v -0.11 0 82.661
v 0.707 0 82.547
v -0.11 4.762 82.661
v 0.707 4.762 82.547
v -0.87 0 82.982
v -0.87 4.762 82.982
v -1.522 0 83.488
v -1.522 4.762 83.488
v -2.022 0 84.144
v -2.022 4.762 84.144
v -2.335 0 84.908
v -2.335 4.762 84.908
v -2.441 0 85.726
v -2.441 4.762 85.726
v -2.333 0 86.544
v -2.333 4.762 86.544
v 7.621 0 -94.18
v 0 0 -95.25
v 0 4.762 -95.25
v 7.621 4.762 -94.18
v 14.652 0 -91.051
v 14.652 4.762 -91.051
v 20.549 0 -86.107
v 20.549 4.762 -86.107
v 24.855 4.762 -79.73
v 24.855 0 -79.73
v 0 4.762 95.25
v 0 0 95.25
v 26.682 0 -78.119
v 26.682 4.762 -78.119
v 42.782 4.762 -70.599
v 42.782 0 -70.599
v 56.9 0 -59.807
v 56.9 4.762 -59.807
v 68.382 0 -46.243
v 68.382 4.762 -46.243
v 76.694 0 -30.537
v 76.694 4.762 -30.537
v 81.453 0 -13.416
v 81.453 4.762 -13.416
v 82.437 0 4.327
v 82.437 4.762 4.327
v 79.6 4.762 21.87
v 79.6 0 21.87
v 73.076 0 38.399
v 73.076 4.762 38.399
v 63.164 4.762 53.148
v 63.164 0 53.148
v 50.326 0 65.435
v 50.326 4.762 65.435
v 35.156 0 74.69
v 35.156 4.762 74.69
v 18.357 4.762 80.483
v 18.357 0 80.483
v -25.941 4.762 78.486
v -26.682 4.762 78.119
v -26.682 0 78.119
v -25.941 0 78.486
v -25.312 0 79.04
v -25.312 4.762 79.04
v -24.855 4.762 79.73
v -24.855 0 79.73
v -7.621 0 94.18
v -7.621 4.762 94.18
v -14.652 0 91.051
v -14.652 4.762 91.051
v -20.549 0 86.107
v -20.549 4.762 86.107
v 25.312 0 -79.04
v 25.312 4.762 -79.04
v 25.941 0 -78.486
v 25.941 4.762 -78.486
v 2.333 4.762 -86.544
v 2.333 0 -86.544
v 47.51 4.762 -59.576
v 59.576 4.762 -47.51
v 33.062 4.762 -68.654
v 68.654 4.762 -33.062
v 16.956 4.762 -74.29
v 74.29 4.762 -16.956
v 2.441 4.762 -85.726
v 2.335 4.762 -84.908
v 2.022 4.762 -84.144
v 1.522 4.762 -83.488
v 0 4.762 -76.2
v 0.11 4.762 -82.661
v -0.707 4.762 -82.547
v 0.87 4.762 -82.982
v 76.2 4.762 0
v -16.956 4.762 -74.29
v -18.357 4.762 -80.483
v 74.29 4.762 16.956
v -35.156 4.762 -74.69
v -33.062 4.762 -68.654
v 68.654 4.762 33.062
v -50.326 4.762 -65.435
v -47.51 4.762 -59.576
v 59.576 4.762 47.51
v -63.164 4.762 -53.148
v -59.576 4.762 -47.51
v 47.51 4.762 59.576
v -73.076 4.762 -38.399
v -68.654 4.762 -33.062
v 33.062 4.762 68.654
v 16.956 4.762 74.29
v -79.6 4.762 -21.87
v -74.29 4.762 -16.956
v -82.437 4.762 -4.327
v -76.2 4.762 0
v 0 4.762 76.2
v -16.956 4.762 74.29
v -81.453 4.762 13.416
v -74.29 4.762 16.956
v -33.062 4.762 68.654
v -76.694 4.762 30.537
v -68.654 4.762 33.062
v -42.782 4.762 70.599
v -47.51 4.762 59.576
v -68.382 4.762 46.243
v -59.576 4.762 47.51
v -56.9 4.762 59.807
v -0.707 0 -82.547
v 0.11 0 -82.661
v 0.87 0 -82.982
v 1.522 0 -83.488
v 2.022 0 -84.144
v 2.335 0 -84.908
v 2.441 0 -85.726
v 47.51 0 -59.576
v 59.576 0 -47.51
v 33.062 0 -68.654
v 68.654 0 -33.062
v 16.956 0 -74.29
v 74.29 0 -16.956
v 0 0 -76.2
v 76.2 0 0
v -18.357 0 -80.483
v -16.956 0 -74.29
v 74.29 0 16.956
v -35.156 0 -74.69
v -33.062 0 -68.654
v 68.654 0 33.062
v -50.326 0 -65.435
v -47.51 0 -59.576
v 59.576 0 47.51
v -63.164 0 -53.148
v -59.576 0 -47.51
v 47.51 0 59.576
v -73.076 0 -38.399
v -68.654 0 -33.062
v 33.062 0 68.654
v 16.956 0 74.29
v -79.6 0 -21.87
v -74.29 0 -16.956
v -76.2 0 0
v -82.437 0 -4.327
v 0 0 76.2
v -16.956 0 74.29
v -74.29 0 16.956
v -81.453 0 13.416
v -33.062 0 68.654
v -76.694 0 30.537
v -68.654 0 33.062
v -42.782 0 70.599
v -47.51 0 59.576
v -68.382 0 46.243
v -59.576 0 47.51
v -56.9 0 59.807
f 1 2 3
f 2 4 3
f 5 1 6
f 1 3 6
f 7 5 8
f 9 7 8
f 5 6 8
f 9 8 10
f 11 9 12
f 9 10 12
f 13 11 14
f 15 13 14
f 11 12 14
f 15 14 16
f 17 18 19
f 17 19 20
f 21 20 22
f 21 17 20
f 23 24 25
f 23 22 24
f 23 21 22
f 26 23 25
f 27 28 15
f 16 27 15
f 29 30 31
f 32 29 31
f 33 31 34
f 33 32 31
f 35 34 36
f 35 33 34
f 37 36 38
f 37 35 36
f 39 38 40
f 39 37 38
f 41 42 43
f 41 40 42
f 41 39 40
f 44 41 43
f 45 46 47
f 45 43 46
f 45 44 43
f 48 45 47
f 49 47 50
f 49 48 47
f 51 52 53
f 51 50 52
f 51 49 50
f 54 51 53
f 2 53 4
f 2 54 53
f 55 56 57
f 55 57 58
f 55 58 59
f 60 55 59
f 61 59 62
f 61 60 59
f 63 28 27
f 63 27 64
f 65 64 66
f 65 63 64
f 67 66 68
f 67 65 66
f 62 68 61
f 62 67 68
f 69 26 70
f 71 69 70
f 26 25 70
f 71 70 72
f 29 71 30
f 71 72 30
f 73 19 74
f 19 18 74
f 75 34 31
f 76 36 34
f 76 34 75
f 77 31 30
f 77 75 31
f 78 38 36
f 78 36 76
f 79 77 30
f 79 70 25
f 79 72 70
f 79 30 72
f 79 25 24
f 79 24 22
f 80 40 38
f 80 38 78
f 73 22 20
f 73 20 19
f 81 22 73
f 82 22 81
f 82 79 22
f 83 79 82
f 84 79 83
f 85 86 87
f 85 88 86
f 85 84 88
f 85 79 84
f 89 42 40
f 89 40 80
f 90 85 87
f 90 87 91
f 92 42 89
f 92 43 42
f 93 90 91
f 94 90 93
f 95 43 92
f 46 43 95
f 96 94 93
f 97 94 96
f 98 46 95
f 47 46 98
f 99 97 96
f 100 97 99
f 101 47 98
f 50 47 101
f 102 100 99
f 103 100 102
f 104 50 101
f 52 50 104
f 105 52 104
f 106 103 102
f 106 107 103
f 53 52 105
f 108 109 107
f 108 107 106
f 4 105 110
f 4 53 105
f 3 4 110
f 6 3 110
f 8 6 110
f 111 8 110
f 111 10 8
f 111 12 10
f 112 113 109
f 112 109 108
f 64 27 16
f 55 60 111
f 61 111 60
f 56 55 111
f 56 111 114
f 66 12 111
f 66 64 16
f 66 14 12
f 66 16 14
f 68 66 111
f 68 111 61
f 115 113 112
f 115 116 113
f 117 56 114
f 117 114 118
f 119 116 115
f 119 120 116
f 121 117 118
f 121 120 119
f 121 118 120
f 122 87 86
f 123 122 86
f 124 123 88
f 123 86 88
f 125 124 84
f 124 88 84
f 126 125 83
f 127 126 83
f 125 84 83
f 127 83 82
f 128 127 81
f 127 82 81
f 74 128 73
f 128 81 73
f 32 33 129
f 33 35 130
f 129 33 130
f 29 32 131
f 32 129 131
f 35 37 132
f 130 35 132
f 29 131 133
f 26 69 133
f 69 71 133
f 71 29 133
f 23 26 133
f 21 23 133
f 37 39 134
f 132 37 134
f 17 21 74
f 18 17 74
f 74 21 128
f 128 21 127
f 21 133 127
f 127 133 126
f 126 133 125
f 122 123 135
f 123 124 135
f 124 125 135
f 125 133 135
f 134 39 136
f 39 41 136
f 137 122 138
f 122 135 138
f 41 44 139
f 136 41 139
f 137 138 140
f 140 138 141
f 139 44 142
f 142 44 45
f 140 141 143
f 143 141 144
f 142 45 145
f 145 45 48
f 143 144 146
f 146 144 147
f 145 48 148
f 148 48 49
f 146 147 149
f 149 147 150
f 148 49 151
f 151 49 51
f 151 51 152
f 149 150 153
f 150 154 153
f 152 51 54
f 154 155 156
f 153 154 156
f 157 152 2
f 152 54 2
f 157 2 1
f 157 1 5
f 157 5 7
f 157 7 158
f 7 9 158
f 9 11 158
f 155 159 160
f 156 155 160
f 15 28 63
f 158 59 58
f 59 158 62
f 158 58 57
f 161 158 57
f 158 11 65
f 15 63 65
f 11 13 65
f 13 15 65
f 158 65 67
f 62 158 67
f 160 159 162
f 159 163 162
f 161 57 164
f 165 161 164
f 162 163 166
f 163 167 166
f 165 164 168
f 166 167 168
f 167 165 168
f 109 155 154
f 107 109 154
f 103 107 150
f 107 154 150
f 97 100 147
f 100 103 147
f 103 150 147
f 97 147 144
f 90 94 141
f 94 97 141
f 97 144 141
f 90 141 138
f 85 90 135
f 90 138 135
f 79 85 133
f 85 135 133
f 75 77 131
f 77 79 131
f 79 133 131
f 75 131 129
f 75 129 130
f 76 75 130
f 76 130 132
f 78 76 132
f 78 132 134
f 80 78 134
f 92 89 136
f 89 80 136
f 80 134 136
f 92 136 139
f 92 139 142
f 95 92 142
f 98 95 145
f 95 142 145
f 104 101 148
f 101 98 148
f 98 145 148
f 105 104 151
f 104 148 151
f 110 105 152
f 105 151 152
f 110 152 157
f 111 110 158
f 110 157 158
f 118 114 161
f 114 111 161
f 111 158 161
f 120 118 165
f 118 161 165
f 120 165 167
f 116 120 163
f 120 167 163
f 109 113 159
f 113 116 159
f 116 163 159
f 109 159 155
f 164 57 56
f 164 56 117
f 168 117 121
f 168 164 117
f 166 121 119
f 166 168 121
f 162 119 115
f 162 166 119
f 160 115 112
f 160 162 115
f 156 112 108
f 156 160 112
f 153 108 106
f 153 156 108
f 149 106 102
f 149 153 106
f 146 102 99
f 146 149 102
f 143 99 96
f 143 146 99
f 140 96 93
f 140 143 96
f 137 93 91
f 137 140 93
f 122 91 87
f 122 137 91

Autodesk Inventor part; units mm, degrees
ref_plane "YZ Plane" through (0, 0, 0) normal (1, 0, 0) x (0, 1, 0)
ref_plane "XZ Plane" through (0, 0, 0) normal (0, 1, 0) x (-1, 0, 0)
ref_plane "XY Plane" through (0, 0, 0) normal (0, 0, 1) x (1, 0, 0)
sketch "Sketch1" plane through (0, 0, 0) normal (0, 1, 0) x (-1, 0, 0)
  circle A0 centre (0, 0) radius 76.2
  circle A1 centre (0, 0) radius 82.55
  line L0 (0, 0) -> (0, -82.55) construction
  line L1 (0, -95.25) -> (-3.422, -82.479)
  arc A2 (-25.4, -78.5452) -> (0, -95.25) centre (0, -67.587) ccw
  line L2 (0, 95.25) -> (3.422, 82.479)
  arc A3 (25.4, 78.5452) -> (0, 95.25) centre (0, 67.587) ccw
  point P0 (0, 82.55)
  point P1 (25.4, 78.5452)
  dimension "d0" = 152.4
  dimension "d1" = 6.35
  dimension "d4" = 15
  dimension "d5" = 12.7
  dimension "d6" = 25.4
  dimension "d9" = 360
extrude "Extrusion1" add sketch "Sketch1" along normal blind 4.7625
fillet "Fillet1" radius 3.175 4 edges at (25.4, 2.3813, -78.5452) (3.422, 2.3813, -82.479) (-25.4, 2.3813, 78.5452) (-3.422, 2.3813, 82.479)
sketch "Sketch2" plane through (0, 4.7625, 0) normal (0, 1, 0) x (1, 0, 0)
  line L0 (0, 95.25) -> (2.3329, 86.5436) projected
  circle A0 centre (0, 0) radius 95.25 construction
properties part number "Blade - Ring" material "Steel, Mild"
